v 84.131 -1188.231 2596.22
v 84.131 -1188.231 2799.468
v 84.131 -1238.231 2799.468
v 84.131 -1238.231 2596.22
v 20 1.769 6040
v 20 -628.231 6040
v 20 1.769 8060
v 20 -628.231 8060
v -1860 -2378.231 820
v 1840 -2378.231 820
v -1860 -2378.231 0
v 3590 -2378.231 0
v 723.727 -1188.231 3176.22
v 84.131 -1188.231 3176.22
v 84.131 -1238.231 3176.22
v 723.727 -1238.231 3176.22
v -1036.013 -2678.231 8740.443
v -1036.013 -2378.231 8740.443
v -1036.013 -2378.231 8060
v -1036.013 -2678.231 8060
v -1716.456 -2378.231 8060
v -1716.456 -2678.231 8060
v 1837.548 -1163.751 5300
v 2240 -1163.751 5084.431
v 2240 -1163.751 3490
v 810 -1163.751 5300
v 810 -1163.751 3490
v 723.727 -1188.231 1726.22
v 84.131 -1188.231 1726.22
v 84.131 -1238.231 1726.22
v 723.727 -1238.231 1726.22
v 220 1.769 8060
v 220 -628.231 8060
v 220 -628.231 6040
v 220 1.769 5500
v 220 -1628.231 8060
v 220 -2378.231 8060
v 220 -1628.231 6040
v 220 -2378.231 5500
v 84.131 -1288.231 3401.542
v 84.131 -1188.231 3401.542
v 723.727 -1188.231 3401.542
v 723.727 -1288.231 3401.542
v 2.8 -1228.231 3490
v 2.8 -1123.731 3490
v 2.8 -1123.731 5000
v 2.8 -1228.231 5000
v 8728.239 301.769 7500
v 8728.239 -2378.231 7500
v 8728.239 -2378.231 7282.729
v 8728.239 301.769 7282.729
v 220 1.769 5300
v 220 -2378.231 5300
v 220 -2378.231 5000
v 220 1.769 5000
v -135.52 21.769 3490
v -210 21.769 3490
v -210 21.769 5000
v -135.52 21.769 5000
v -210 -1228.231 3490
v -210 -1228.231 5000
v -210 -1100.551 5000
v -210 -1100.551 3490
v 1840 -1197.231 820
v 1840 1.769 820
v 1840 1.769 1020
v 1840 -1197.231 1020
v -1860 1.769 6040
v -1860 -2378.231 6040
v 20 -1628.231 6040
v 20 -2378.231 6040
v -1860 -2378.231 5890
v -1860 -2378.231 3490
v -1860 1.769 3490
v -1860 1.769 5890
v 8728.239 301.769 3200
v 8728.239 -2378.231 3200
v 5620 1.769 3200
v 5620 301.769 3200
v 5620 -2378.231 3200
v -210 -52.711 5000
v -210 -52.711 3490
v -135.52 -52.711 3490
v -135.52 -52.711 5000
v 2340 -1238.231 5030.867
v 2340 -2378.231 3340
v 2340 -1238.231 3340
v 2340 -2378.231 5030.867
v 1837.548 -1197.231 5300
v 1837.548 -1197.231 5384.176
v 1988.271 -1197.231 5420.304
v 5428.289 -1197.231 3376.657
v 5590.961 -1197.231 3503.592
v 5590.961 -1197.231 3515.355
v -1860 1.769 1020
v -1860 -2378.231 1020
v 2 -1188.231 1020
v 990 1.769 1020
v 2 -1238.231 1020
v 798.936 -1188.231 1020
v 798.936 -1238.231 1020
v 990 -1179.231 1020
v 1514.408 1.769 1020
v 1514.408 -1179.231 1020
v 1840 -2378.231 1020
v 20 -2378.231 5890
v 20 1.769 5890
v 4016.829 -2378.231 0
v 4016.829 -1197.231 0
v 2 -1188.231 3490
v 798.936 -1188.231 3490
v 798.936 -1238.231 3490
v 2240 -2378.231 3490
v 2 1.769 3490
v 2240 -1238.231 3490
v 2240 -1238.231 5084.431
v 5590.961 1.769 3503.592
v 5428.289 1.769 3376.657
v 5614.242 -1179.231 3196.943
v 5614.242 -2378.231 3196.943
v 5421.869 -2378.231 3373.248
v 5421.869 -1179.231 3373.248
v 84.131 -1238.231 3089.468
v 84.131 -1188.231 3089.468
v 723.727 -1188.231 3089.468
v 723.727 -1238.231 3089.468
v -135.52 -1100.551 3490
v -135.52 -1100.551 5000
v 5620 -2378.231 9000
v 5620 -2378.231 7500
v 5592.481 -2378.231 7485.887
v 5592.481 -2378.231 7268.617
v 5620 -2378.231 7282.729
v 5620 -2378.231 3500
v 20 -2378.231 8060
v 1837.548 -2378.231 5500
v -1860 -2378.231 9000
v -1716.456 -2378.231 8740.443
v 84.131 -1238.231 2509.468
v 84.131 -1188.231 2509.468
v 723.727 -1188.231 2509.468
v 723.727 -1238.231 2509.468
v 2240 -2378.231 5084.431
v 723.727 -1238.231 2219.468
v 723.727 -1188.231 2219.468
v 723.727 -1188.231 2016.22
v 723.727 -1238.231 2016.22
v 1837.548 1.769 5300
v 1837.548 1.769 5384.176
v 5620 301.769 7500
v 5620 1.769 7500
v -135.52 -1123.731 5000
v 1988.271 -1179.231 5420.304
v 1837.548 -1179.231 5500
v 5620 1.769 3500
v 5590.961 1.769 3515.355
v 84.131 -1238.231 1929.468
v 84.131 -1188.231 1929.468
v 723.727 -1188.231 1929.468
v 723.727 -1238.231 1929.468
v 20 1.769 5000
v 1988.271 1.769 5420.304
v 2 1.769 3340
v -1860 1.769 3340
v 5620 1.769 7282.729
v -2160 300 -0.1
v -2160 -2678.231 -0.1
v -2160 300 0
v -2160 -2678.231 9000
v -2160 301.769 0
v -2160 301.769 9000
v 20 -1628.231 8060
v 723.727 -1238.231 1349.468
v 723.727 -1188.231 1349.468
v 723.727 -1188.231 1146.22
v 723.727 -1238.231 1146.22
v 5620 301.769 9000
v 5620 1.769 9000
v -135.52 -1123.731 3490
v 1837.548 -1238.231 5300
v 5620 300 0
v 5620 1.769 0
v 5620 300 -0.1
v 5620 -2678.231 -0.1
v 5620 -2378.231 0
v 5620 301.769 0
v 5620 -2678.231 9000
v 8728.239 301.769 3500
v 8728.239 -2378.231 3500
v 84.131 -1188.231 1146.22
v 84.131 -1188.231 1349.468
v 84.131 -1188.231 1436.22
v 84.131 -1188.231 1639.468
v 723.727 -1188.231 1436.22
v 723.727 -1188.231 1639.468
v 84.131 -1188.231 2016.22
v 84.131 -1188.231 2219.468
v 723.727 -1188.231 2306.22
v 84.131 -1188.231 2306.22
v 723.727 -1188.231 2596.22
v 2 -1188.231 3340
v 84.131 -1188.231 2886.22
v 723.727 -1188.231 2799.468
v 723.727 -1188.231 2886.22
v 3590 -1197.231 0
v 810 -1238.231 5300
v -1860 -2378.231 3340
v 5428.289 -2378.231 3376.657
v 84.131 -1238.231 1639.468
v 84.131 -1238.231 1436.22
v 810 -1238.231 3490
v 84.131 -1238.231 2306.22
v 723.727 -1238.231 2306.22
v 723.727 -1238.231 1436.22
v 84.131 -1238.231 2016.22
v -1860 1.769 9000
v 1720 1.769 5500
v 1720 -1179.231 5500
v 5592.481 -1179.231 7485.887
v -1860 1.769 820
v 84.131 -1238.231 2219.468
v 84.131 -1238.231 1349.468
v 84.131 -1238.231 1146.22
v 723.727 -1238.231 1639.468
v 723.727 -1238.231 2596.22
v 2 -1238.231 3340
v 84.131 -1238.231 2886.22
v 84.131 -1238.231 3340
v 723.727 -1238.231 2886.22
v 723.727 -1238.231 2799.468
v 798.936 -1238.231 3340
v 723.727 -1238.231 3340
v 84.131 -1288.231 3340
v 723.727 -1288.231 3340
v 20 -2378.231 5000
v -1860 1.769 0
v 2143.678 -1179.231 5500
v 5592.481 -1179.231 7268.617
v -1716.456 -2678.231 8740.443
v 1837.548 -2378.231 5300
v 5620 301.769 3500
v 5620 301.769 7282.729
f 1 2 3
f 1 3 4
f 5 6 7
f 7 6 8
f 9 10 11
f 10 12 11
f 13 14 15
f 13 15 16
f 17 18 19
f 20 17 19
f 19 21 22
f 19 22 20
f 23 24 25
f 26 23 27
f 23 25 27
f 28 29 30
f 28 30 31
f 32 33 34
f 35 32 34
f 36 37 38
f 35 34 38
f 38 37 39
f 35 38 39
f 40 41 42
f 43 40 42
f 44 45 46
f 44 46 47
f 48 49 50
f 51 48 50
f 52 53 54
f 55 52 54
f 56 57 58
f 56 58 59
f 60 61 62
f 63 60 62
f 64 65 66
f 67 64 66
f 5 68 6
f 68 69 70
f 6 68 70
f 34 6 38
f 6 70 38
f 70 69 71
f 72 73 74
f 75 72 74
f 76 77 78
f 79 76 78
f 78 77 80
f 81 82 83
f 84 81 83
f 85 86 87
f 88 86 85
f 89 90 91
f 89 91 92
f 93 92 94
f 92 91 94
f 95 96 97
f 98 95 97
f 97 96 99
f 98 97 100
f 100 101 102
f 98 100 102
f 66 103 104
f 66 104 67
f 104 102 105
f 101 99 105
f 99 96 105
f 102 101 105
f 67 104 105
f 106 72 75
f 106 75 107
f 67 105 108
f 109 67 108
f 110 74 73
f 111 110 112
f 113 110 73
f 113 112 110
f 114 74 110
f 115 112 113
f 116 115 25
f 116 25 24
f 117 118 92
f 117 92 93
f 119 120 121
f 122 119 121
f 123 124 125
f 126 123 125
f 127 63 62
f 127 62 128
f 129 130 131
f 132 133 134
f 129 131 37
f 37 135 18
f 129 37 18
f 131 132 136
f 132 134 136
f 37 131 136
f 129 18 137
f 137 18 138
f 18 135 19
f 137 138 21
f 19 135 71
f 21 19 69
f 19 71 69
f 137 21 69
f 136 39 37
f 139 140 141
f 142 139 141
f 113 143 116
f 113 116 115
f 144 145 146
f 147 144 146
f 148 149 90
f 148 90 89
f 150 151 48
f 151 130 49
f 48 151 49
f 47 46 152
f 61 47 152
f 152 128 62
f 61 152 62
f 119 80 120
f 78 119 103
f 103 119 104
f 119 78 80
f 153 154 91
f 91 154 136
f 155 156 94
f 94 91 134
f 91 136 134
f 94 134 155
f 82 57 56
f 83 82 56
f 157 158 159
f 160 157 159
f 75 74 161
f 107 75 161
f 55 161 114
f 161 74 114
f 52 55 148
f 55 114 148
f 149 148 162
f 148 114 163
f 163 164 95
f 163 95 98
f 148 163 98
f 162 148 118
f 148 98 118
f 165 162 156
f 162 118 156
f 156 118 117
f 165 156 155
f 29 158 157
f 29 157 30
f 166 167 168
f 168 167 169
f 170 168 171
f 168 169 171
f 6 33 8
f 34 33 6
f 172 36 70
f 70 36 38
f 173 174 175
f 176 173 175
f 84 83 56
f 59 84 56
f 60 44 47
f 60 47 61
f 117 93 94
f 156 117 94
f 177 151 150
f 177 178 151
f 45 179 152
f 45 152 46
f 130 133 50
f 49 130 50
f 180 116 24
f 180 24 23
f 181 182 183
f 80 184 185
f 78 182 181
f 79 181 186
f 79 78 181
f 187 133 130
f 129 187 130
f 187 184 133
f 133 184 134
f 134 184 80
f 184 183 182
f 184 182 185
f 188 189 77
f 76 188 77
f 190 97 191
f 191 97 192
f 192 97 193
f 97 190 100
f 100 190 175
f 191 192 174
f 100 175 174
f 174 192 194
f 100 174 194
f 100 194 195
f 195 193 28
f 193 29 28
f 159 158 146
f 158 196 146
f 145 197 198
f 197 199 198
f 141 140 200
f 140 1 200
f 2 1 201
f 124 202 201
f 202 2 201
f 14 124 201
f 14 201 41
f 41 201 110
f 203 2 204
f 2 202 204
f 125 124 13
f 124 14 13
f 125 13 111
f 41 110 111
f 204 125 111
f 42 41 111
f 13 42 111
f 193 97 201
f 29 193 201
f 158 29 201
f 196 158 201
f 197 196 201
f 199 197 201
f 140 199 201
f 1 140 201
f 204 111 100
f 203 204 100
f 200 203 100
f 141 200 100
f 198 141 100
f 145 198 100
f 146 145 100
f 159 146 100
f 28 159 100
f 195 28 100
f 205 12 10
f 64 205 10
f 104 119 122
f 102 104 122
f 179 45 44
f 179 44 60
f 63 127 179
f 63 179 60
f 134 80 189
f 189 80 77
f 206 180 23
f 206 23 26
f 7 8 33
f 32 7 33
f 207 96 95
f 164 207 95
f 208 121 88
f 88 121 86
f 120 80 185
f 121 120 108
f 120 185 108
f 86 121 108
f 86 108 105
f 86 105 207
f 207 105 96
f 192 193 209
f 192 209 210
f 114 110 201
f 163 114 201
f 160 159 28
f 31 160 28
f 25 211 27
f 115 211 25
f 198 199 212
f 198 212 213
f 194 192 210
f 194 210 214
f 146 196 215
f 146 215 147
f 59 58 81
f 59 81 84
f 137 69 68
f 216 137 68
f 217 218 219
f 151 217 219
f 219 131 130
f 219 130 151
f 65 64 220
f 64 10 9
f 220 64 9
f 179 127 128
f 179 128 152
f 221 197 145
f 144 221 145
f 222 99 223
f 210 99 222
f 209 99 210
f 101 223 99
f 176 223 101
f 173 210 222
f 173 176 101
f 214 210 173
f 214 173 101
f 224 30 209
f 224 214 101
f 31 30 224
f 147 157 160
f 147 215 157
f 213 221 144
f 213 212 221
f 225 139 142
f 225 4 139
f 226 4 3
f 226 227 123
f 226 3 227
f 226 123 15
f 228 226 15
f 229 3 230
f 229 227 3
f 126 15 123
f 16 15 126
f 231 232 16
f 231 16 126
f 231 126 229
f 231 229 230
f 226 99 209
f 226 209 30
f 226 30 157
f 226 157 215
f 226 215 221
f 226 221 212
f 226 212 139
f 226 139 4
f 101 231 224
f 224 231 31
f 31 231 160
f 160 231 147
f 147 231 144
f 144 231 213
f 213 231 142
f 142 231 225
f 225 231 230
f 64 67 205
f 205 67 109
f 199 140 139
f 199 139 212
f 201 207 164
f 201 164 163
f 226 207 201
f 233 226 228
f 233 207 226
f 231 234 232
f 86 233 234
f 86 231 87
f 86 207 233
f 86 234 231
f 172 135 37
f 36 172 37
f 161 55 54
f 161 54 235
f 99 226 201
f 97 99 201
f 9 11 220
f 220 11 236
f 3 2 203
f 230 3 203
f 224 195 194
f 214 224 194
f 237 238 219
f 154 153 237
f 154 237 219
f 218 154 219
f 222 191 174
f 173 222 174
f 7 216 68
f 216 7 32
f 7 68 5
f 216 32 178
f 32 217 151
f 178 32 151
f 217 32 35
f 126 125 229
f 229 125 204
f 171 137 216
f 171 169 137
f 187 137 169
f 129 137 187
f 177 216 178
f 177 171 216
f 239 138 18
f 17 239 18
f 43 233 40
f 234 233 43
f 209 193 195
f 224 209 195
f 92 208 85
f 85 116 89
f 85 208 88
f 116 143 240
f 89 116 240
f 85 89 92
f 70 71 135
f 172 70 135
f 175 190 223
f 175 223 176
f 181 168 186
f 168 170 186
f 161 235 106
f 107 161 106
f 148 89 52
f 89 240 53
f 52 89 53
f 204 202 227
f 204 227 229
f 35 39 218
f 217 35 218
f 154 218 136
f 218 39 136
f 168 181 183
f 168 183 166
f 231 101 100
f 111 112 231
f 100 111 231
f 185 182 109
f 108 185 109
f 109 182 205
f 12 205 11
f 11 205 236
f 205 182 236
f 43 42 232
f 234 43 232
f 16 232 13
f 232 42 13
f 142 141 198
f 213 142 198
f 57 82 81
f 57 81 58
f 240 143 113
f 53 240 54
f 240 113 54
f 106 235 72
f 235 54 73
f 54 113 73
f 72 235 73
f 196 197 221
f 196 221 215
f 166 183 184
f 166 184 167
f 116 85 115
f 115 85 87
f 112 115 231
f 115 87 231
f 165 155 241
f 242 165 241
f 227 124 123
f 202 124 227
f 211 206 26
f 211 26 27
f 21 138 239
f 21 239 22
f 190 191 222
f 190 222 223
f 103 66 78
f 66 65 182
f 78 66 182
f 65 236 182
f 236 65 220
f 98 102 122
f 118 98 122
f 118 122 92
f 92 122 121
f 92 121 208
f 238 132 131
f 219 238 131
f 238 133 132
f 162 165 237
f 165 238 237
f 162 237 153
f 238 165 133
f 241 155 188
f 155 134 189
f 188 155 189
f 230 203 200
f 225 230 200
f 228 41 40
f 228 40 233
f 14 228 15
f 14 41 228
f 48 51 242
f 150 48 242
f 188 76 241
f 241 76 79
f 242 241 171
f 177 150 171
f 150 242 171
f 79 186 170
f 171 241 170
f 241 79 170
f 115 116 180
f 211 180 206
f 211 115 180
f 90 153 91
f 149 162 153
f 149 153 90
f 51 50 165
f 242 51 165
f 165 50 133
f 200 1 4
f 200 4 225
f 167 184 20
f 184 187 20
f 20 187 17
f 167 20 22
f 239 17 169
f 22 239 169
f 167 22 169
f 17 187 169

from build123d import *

# Parameters (mm, degrees)
BOSS_EXTRUDE1_DEPTH   = 9000
SKETCH2_W             = 7780
SKETCH2_H             = 2978.231465283
BOSS_EXTRUDE2_DEPTH   = 0.1
SKETCH4_W             = 680.442603136
SKETCH4_H             = 680.442603136
CUT_EXTRUDE1_DEPTH    = 301
BOSS_EXTRUDE3_DEPTH   = 2680
SKETCH11_W            = 3750
SKETCH11_H            = 1150
CUT_EXTRUDE10_DEPTH   = 1199
CUT_EXTRUDE16_DEPTH   = 1199
CUT_EXTRUDE19_DEPTH   = 1199
SKETCH15_W            = 1880
SKETCH15_H            = 150
BOSS_EXTRUDE4_DEPTH   = 1140
BOSS_EXTRUDE5_REACH   = 2682
SKETCH15_2_W          = 1880
SKETCH15_2_H          = 150
BOSS_EXTRUDE6_REACH   = 1542
SKETCH16_W            = 1862
SKETCH16_H            = 150
SKETCH17_W            = 796.936278508
SKETCH17_H            = 50
BOSS_EXTRUDE7_DEPTH   = 2470
SKETCH18_W            = 639.595844291
SKETCH18_H            = 225.322127185
SKETCH18_H_2          = 203.248531495
CUT_EXTRUDE21_DEPTH   = 100
SKETCH19_W            = 74.48
SKETCH19_H            = 74.48
BOSS_EXTRUDE8_DEPTH   = 1510
BOSS_EXTRUDE8_2_DEPTH = 1510
BOSS_EXTRUDE9_DEPTH   = 74.48
SKETCH22_W            = 2020
SKETCH22_H            = 1000
CUT_EXTRUDE22_DEPTH   = 597


with BuildPart() as part:
    # Sketch1 → Boss-Extrude1 (new body)
    with BuildSketch(Plane.XY):
        Polygon((5620, 1.768534717), (5620, 301.768534717), (-2160, 301.768534717), (-2160, -2678.231465283), (5620, -2678.231465283), (5620, -2378.231465283), (50, -2378.231465283), (-1860, -2378.231465283), (-1860, 1.768534717), (-250, 1.768534717), align=None)
    extrude(amount=BOSS_EXTRUDE1_DEPTH)

    # Sketch2 → Boss-Extrude2 (add)
    with BuildSketch(Plane(origin=(0, 0, 0), x_dir=(-1, 0, 0), z_dir=(0, 0, -1))):
        with Locations((-1730, -1189.115732642)):
            Rectangle(SKETCH2_W, SKETCH2_H)
    extrude(amount=BOSS_EXTRUDE2_DEPTH)

    # Sketch4 → Cut-Extrude1 (cut, through all)
    with BuildSketch(Plane(origin=(0, -2378.231465283, 0), x_dir=(1, 0, 0), z_dir=(0, 1, 0))):
        with Locations((-1376.234625342, -8400.221301568)):
            Rectangle(SKETCH4_W, SKETCH4_H)
    extrude(amount=-CUT_EXTRUDE1_DEPTH, mode=Mode.SUBTRACT)

    # Sketch4<9> → Boss-Extrude3 (add, through all)
    with BuildSketch(Plane(origin=(0, -2378.231465283, 0), x_dir=(1, 0, 0), z_dir=(0, 1, 0))):
        Polygon((-1860, -820), (-1860, -1020), (990, -1020), (5428.28891254, -3376.656663831), (1837.547859336, -5300), (220, -5300), (220, -5000), (20, -5000), (20, -8060), (220, -8060), (220, -5500), (1720, -5500), (5620, -7500), (8728.239316984, -7500), (8728.239316984, -7282.729144798), (5620, -7282.729144798), (1988.270990282, -5420.304011609), (5620, -3500), (8728.239316984, -3500), (8728.239316984, -3200), (5620, -3200), (1514.40838887, -1020), (1840, -1020), (4016.829268293, 0), (3590, 0), (1840, -820), align=None)
    extrude(amount=BOSS_EXTRUDE3_DEPTH)

    # Sketch11 → Cut-Extrude10 (cut)
    with BuildSketch(Plane.XZ.offset(-1.768534717)):
        with Locations((3715, 575)):
            Rectangle(SKETCH11_W, SKETCH11_H)
        Polygon((1837.547859336, 5300), (1837.547859336, 3630), (4743.976621723, 3630), (5428.28891254, 3376.656663831), (5590.960805155, 3503.591784624), (5590.960805155, 5232.391121441), (3118.319216172, 5232.391121441), (3118.319216172, 5420.304011609), (1988.270990282, 5420.304011609), (1837.547859336, 5384.175694281), align=None)
    extrude(amount=CUT_EXTRUDE10_DEPTH, mode=Mode.SUBTRACT)

    # Sketch13 → Cut-Extrude16 (cut)
    with BuildSketch(Plane(origin=(0, -2378.231465283, 0), x_dir=(1, 0, 0), z_dir=(0, 1, 0))):
        Polygon((357.775791901, -1020), (5620, -1020), (5620, -3191.666212547), (5403.889674001, -3389.725863798), (357.775791901, -3389.725863798), align=None)
    extrude(amount=CUT_EXTRUDE16_DEPTH, mode=Mode.SUBTRACT)

    # Sketch14 → Cut-Extrude19 (cut)
    with BuildSketch(Plane(origin=(0, -2378.231465283, 0), x_dir=(1, 0, 0), z_dir=(0, 1, 0))):
        Polygon((1347.188843085, -5500), (1837.547859336, -5500), (1988.270990282, -5420.304011609), (2143.678167645, -5500), (5592.480550887, -5500), (5592.480550887, -7500), (1347.188843085, -7500), align=None)
    extrude(amount=CUT_EXTRUDE19_DEPTH, mode=Mode.SUBTRACT)

    # Sketch15 → Boss-Extrude4 (add)
    with BuildSketch(Plane(origin=(0, -2378.231465283, 0), x_dir=(1, 0, 0), z_dir=(0, 1, 0))):
        Polygon((2240, -5084.430670047), (2240, -3490), (-1860, -3490), (-1860, -3340), (2340, -3340), (2340, -5030.86670351), align=None)
        with Locations((-920, -5965)):
            Rectangle(SKETCH15_W, SKETCH15_H)
    extrude(amount=BOSS_EXTRUDE4_DEPTH)

    # Sketch15<2> → Boss-Extrude5 (add, up to next)
    with BuildSketch(Plane(origin=(0, -2378.231465283, 0), x_dir=(1, 0, 0), z_dir=(0, 1, 0)), mode=Mode.PRIVATE) as boss_extrude5_sk1:
        with Locations((-920, -5965)):
            Rectangle(SKETCH15_2_W, SKETCH15_2_H)
    boss_extrude5_tool1 = extrude(boss_extrude5_sk1.sketch, amount=BOSS_EXTRUDE5_REACH, mode=Mode.PRIVATE) - part.part
    add(boss_extrude5_tool1.solids().sort_by_distance((-920, -2378.231465, 5965))[0])

    # Sketch16 → Boss-Extrude6 (add, up to next)
    with BuildSketch(Plane(origin=(0, -1238.231465283, 0), x_dir=(1, 0, 0), z_dir=(0, 1, 0)), mode=Mode.PRIVATE) as boss_extrude6_sk1:
        with Locations((-929, -3415)):
            Rectangle(SKETCH16_W, SKETCH16_H)
    boss_extrude6_tool1 = extrude(boss_extrude6_sk1.sketch, amount=BOSS_EXTRUDE6_REACH, mode=Mode.PRIVATE) - part.part
    add(boss_extrude6_tool1.solids().sort_by_distance((-929, -1238.231465, 3415))[0])

    # Sketch17 → Boss-Extrude7 (add)
    with BuildSketch(Plane.XY.offset(3490)):
        with Locations((400.468139254, -1213.231465283)):
            Rectangle(SKETCH17_W, SKETCH17_H)
    extrude(amount=-BOSS_EXTRUDE7_DEPTH)

    # Sketch18 → Cut-Extrude21 (cut)
    with BuildSketch(Plane(origin=(0, -1188.231465283, 0), x_dir=(1, 0, 0), z_dir=(0, 1, 0))):
        with Locations((403.928784528, -3288.880572499)):
            Rectangle(SKETCH18_W, SKETCH18_H)
        with Locations((403.928784528, -1827.843774654)):
            Rectangle(SKETCH18_W, SKETCH18_H_2)
        with Locations((403.928784528, -2117.843774654)):
            Rectangle(SKETCH18_W, SKETCH18_H_2)
        with Locations((403.928784528, -2407.843774654)):
            Rectangle(SKETCH18_W, SKETCH18_H_2)
        with Locations((403.928784528, -2697.843774654)):
            Rectangle(SKETCH18_W, SKETCH18_H_2)
        with Locations((403.928784528, -2987.843774654)):
            Rectangle(SKETCH18_W, SKETCH18_H_2)
        with Locations((403.928784528, -1537.843774654)):
            Rectangle(SKETCH18_W, SKETCH18_H_2)
        with Locations((403.928784528, -1247.843774654)):
            Rectangle(SKETCH18_W, SKETCH18_H_2)
    extrude(amount=-CUT_EXTRUDE21_DEPTH, mode=Mode.SUBTRACT)

    # Sketch22 → Cut-Extrude22 (cut)
    with BuildSketch(Plane(origin=(220, 0, 0), x_dir=(0, 0, -1), z_dir=(1, 0, 0))):
        with Locations((-7050, -1128.231465283)):
            Rectangle(SKETCH22_W, SKETCH22_H)
    extrude(amount=-CUT_EXTRUDE22_DEPTH, mode=Mode.SUBTRACT)


with BuildPart() as body_2:
    # Sketch19 → Boss-Extrude8 (new body)
    with BuildSketch(Plane.XY.offset(3490)):
        with Locations((-172.76, -15.471465283)):
            Rectangle(SKETCH19_W, SKETCH19_H)
    extrude(amount=BOSS_EXTRUDE8_DEPTH)


with BuildPart() as body_3:
    # Sketch19 → Boss-Extrude8 2 (new body)
    with BuildSketch(Plane.XY.offset(3490)):
        Polygon((-135.52, -1123.731465283), (2.8, -1123.731465283), (2.8, -1228.231465283), (-210, -1228.231465283), (-210, -1100.551465283), (-135.52, -1100.551465283), align=None)
    extrude(amount=BOSS_EXTRUDE8_2_DEPTH)


with BuildPart() as body_4:
    # Sketch21 → Boss-Extrude9 (new body)
    with BuildSketch(Plane(origin=(0, -1238.231465283, 0), x_dir=(1, 0, 0), z_dir=(0, 1, 0))):
        Polygon((810, -3490), (2240, -3490), (2240, -5084.430670047), (1837.547859336, -5300), (810, -5300), align=None)
    extrude(amount=BOSS_EXTRUDE9_DEPTH)


solid = Compound([part.part, body_2.part, body_3.part, body_4.part])
